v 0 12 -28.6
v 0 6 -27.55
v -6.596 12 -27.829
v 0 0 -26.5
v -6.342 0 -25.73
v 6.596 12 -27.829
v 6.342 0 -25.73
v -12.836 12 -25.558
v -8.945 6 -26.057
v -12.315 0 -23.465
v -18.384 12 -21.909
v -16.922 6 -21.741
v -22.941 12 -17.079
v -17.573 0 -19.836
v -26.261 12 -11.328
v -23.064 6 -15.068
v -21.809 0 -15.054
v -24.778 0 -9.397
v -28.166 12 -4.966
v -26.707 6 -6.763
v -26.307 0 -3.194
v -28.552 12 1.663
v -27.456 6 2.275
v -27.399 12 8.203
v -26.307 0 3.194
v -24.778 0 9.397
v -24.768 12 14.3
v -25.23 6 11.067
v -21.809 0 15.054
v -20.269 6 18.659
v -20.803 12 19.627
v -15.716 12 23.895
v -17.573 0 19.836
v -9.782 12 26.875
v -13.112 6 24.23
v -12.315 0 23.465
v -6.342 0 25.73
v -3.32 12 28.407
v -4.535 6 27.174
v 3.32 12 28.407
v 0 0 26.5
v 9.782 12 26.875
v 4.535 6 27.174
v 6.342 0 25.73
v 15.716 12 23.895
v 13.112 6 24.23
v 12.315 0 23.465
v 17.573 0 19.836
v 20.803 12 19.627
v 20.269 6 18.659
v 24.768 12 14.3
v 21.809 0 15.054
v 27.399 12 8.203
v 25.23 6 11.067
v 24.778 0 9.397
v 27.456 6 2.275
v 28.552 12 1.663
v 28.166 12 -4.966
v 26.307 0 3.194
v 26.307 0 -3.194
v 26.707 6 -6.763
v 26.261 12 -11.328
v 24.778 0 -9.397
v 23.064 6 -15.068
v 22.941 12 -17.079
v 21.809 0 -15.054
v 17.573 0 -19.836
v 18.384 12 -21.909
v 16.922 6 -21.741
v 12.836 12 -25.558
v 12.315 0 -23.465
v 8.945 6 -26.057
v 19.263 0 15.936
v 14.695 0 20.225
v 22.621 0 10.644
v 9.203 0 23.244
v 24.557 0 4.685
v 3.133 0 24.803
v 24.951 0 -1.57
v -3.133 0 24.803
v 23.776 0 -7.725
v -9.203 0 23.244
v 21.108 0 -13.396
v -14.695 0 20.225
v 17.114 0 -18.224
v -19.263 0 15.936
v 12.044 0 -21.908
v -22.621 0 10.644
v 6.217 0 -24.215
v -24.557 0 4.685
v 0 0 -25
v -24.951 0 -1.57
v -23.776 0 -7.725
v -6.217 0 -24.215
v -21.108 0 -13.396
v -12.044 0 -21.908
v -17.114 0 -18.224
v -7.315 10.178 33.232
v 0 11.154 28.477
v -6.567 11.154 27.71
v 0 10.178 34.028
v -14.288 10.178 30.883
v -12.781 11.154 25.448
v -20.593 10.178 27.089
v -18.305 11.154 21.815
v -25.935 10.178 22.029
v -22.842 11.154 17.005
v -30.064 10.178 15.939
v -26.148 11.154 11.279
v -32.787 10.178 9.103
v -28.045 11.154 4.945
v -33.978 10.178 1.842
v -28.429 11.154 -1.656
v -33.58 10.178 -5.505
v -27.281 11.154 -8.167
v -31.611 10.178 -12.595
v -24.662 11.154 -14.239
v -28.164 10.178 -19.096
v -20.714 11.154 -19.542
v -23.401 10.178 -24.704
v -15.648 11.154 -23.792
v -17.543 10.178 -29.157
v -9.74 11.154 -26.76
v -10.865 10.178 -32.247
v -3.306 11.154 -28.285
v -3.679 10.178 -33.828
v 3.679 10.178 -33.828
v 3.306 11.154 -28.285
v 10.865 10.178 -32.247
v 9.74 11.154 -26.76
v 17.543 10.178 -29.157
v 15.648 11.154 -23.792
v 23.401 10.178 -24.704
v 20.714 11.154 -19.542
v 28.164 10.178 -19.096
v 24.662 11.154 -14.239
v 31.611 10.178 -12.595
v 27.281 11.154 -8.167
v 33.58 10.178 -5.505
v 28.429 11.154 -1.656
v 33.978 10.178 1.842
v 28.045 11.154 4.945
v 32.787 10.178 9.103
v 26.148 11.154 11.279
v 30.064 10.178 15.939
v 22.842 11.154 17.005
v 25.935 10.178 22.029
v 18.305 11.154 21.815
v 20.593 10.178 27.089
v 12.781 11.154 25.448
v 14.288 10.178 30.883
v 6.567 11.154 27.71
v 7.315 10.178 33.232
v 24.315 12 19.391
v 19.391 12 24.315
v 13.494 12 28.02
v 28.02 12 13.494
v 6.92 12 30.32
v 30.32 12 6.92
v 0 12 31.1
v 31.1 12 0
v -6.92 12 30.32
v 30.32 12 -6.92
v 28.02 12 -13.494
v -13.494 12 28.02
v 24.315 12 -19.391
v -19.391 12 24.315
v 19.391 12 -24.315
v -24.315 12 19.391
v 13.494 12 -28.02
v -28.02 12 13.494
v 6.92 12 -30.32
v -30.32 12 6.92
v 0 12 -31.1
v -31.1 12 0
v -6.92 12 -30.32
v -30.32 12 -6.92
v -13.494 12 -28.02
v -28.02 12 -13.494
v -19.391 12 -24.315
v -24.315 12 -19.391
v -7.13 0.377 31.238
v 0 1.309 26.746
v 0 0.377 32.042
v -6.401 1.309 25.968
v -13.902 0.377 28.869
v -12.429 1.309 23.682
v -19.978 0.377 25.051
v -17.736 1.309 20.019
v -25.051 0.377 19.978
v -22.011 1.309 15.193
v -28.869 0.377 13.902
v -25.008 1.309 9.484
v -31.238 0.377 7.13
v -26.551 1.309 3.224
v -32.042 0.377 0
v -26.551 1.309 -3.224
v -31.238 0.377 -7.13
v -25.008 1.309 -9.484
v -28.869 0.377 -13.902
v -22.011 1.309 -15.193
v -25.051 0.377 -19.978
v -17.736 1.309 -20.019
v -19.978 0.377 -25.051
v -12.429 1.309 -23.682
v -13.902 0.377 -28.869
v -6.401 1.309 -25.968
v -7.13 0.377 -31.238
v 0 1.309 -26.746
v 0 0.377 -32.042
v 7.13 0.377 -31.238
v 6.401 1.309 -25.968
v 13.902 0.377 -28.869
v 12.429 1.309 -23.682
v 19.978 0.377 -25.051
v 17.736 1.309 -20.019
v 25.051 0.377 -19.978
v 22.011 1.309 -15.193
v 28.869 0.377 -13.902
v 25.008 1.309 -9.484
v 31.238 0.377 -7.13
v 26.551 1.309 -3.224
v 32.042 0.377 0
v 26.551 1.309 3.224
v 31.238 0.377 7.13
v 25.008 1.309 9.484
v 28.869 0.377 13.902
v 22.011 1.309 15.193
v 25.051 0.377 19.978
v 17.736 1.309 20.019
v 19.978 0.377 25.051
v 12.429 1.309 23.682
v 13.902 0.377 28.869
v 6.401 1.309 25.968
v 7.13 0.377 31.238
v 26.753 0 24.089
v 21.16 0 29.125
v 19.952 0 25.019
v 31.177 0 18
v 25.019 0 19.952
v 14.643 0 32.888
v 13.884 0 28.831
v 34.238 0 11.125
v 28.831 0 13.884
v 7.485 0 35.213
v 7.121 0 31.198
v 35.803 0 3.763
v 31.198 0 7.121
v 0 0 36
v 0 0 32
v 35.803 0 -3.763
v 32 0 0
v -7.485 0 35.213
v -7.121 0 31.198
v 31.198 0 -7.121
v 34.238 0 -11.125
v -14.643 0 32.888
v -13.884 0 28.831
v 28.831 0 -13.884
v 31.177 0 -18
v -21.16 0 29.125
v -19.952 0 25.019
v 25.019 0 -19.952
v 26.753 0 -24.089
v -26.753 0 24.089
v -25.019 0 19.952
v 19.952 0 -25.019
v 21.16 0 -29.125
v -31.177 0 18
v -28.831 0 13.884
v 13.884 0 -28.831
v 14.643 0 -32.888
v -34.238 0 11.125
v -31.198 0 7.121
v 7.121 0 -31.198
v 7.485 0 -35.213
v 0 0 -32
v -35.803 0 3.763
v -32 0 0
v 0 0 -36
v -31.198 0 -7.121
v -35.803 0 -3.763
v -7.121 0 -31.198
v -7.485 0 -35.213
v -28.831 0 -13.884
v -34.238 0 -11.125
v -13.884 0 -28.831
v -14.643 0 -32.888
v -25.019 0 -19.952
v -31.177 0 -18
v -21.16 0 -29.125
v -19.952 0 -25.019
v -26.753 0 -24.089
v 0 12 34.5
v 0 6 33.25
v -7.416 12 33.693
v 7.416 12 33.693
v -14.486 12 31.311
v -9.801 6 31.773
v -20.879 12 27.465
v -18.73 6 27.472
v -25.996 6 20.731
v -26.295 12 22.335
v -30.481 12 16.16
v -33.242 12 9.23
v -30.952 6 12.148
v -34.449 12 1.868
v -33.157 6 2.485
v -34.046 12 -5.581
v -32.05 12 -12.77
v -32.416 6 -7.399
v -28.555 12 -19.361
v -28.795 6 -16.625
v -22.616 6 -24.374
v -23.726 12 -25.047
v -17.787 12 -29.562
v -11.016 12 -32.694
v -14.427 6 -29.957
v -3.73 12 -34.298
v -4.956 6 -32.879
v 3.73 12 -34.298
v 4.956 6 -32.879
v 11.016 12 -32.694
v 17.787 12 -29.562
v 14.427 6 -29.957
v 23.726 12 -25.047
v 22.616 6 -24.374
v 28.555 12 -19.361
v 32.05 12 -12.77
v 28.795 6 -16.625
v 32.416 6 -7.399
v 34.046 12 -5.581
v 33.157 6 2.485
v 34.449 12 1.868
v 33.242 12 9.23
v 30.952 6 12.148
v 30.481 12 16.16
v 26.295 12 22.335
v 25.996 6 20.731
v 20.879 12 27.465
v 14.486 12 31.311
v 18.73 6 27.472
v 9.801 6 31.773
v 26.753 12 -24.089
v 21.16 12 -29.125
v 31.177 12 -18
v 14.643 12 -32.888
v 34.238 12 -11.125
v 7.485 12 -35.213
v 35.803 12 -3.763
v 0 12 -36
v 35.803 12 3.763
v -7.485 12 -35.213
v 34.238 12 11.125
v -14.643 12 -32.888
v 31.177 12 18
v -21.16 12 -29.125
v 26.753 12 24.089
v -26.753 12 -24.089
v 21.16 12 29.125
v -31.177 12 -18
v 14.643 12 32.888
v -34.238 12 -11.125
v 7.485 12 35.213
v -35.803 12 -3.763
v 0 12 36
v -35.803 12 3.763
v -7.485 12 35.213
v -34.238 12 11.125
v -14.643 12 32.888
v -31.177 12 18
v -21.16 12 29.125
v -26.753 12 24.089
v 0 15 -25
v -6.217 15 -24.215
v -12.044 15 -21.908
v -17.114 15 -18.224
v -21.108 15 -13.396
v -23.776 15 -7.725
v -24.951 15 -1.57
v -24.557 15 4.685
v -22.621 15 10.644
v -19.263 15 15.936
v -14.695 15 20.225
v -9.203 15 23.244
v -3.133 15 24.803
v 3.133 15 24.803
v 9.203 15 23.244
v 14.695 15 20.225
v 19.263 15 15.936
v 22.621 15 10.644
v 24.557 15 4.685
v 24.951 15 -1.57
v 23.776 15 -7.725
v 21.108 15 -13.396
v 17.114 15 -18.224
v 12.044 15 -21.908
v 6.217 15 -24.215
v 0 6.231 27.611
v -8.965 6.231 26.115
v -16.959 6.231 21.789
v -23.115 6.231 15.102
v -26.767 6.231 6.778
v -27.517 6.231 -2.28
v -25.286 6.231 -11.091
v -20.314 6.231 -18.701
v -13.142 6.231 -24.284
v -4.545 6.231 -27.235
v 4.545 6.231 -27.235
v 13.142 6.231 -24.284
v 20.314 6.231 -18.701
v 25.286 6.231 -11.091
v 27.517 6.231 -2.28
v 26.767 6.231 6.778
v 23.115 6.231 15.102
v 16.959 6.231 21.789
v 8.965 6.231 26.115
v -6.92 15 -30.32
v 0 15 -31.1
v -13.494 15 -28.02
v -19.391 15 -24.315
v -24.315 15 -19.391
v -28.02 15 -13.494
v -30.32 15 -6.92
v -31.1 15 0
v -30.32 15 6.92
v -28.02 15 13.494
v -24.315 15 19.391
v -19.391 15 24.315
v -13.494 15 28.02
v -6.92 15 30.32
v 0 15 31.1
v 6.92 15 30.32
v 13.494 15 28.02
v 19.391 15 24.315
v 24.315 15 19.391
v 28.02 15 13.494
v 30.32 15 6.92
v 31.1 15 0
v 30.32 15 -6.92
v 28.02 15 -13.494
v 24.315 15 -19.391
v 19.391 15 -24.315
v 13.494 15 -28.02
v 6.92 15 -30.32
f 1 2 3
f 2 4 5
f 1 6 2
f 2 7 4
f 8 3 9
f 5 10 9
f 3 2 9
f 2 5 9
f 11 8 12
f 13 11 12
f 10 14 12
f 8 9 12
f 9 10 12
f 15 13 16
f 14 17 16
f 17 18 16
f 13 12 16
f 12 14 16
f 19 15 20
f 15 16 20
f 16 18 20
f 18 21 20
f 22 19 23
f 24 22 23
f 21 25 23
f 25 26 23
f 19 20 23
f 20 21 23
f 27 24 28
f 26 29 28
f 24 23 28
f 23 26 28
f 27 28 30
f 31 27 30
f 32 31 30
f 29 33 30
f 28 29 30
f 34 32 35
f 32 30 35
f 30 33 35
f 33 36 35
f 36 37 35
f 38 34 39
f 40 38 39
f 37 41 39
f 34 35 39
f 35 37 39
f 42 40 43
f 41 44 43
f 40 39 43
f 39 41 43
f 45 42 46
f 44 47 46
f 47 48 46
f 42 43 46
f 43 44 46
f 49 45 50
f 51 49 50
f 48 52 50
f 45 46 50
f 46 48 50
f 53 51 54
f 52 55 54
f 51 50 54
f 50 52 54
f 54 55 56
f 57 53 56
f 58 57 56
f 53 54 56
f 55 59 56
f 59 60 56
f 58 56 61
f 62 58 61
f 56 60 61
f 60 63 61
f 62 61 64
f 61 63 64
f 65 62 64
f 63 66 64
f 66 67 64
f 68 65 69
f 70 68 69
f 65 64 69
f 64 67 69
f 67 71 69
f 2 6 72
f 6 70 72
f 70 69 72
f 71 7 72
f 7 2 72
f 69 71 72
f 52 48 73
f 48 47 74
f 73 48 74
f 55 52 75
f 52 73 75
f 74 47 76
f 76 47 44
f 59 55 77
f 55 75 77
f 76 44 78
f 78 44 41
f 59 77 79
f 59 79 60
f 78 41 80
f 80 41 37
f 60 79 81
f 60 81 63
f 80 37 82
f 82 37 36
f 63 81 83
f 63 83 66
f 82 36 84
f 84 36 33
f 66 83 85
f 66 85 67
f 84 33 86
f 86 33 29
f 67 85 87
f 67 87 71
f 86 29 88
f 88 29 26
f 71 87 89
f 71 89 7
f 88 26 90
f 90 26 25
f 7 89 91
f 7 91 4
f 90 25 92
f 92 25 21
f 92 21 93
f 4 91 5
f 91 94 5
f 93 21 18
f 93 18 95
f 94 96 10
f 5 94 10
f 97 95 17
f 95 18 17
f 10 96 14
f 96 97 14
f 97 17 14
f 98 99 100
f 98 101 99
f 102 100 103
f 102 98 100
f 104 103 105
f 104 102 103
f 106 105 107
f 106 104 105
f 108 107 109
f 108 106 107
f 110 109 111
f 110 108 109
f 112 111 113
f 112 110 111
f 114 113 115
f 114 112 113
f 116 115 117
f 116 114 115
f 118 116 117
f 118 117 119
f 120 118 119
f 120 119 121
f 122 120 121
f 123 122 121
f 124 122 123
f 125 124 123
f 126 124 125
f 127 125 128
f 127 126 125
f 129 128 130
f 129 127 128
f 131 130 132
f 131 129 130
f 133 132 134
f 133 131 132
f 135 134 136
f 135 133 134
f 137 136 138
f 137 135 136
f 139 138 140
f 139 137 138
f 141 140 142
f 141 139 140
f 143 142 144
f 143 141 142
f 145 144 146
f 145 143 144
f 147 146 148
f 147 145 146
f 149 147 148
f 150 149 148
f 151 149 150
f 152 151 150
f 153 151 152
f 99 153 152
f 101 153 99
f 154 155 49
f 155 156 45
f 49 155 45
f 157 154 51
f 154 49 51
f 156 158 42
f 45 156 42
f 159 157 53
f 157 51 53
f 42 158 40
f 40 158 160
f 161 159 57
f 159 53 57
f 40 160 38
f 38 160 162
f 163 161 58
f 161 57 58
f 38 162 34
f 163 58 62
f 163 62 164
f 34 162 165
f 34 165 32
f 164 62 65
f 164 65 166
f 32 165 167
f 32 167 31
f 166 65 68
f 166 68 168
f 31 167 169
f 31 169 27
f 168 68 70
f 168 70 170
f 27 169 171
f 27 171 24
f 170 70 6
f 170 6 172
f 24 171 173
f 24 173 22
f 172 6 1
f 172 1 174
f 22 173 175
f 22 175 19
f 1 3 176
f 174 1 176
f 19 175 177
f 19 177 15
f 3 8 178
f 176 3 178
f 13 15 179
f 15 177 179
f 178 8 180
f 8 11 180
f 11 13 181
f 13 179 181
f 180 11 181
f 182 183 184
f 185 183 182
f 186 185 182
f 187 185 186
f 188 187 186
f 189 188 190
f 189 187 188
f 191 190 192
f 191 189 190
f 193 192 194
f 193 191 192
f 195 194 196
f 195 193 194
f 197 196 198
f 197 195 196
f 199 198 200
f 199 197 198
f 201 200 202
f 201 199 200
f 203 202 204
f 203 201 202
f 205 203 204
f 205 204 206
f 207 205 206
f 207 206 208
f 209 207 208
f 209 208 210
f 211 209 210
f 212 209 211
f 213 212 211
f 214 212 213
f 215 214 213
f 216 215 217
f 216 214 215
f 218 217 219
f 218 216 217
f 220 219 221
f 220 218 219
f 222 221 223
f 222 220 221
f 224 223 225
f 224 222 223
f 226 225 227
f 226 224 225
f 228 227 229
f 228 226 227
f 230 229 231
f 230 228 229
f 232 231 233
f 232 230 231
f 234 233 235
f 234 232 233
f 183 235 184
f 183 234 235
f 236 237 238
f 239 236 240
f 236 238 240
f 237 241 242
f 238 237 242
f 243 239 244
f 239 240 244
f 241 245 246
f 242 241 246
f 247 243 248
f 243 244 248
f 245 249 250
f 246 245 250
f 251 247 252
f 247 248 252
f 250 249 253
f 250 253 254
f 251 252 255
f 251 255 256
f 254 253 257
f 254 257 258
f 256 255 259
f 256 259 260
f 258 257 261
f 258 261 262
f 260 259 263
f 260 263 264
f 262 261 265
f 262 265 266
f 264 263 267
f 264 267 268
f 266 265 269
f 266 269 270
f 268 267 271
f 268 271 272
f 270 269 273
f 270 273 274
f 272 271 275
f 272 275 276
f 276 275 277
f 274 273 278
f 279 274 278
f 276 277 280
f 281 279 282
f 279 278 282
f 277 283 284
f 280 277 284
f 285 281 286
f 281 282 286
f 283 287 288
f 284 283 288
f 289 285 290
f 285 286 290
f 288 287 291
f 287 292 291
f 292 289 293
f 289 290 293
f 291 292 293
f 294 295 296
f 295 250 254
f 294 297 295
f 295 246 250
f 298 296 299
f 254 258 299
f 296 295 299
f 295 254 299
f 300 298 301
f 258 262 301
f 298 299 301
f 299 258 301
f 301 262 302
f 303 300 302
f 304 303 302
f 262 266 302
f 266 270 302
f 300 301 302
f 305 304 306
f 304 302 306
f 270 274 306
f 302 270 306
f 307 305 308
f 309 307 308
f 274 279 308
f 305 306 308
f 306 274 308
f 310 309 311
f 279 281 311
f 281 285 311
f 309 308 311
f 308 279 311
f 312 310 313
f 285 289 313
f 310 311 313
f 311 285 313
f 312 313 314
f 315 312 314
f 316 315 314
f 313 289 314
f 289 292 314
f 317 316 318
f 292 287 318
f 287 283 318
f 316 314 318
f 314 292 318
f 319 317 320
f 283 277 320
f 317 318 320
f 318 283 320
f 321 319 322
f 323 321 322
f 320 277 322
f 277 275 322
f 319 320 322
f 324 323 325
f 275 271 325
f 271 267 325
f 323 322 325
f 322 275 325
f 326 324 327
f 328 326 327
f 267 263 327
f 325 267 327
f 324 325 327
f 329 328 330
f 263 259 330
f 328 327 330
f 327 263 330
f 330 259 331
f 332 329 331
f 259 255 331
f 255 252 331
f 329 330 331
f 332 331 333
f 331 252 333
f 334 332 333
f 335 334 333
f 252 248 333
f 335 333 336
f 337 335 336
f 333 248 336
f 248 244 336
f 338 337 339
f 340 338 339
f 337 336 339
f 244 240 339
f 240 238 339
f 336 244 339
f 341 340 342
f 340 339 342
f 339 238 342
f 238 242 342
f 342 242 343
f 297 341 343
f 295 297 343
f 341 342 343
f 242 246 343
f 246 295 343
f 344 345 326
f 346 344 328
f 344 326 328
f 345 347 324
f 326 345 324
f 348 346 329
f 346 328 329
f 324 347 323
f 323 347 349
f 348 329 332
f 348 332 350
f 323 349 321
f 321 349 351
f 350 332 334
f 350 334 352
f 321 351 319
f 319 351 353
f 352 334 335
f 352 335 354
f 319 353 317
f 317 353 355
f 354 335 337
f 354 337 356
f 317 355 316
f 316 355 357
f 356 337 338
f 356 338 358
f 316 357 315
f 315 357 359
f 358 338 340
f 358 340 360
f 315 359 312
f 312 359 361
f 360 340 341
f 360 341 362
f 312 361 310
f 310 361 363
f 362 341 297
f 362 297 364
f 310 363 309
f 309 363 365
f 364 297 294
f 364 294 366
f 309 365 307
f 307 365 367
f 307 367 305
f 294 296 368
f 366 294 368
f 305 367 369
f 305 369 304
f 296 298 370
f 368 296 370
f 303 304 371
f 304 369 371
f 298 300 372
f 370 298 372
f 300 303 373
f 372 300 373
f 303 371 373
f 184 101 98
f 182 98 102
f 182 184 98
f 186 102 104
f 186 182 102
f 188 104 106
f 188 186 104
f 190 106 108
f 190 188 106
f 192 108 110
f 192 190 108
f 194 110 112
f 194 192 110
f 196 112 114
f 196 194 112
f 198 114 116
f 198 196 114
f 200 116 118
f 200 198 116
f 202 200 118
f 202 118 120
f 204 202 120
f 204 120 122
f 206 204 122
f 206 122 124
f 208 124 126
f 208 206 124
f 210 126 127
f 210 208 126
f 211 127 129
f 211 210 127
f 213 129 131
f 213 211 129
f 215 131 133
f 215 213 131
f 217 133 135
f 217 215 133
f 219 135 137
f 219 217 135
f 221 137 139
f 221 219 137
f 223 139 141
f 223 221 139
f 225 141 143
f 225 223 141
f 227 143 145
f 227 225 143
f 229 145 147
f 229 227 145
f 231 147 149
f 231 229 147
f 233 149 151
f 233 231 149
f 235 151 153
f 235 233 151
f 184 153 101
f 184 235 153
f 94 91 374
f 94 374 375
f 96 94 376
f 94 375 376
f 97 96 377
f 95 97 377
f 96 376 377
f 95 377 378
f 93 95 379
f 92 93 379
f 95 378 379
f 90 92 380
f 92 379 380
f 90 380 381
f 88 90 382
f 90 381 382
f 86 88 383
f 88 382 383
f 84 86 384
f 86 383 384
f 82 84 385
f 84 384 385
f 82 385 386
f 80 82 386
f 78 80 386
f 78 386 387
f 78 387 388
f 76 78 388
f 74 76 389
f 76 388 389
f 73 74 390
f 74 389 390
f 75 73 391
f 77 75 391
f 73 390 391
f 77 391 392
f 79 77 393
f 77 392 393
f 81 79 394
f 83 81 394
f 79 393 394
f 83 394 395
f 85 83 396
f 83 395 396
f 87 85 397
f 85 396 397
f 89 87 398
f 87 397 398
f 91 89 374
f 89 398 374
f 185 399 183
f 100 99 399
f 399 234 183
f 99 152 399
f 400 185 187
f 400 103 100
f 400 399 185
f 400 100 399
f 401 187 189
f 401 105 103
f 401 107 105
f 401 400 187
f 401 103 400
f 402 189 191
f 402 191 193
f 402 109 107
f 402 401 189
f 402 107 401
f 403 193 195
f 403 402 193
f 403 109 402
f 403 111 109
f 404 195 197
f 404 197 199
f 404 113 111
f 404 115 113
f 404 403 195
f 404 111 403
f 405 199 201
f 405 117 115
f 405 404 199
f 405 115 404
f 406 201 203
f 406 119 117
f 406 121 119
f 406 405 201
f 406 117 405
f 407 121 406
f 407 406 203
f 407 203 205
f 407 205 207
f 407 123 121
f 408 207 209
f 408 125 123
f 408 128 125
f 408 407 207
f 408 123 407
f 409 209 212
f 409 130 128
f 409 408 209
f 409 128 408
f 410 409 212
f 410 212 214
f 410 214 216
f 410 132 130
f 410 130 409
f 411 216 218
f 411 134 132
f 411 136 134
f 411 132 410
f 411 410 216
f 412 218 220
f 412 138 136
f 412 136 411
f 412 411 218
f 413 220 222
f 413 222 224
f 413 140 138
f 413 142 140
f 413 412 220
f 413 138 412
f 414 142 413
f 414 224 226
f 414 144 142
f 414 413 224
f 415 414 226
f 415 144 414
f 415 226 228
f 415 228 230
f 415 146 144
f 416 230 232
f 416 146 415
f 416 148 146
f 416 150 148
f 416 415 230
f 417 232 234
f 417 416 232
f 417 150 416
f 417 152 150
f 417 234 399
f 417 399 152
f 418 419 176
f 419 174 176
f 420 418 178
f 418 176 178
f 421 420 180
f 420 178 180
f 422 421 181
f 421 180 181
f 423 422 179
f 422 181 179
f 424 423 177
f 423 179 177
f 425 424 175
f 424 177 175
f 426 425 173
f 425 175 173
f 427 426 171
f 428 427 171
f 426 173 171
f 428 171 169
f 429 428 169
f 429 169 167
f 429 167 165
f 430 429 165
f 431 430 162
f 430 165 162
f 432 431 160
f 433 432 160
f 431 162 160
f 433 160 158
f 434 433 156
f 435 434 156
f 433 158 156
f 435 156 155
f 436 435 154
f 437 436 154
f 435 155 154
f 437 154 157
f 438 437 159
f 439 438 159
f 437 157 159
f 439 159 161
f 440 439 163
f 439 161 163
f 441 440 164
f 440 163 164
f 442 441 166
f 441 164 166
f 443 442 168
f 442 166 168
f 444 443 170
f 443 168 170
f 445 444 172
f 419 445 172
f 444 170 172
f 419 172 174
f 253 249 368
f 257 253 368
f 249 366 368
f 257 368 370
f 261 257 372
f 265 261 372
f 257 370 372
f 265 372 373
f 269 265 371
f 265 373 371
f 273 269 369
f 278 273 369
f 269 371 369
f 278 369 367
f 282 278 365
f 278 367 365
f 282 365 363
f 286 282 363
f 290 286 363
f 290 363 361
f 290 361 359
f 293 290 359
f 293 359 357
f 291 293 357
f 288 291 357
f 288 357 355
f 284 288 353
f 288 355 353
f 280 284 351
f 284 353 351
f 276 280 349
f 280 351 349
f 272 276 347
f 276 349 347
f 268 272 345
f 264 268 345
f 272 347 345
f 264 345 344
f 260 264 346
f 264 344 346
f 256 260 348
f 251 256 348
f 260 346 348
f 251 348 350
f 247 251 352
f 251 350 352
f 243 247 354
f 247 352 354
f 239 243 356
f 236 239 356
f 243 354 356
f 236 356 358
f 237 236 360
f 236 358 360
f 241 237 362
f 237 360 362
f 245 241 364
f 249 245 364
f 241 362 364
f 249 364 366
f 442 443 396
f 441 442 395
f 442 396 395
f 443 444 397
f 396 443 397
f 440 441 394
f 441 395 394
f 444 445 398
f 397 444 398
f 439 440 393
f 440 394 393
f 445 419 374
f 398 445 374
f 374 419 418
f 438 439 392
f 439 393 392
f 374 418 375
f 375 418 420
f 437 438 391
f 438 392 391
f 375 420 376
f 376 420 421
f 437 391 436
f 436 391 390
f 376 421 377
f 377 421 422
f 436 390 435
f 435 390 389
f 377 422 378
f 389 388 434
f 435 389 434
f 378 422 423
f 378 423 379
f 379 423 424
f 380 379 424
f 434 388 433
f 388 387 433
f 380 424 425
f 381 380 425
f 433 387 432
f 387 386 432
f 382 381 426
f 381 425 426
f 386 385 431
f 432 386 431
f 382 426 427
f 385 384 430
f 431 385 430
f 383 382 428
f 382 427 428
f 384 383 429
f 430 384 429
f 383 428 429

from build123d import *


with BuildPart() as part:
    # Skizze1 → Rotation1 (revolve)
    with BuildSketch(Plane.XY, mode=Mode.PRIVATE) as rotation1_sk:
        Polygon((32, 0), (36, 0), (36, 12), (34.5, 12), align=None)
    revolve(rotation1_sk.sketch.rotate(Axis((0, 0, 0), (0, -1, 0)), 90), axis=Axis((0, 0, 0), (0, -1, 0)))


with BuildPart() as body_2:
    # Skizze4 → Rotation2 (revolve)
    with BuildSketch(Plane.XY, mode=Mode.PRIVATE) as rotation2_sk:
        Polygon((26.5, 0), (25, 0), (25, 15), (31.1, 15), (31.1, 12), (28.6, 12), align=None)
    revolve(rotation2_sk.sketch.rotate(Axis((0, 0, 0), (0, 1, 0)), 90), axis=Axis((0, 0, 0), (0, 1, 0)))


with BuildPart() as body_3:
    # Skizze5 → Rotation3 (revolve)
    with BuildSketch(Plane.XY, mode=Mode.PRIVATE) as rotation3_sk:
        Polygon((32.041793551, 0.377136413), (26.74567254, 1.308546655), (28.477177317, 11.154110311), (34.02778686, 10.177944062), align=None)
    revolve(rotation3_sk.sketch.rotate(Axis((0, 0, 0), (0, -1, 0)), 90), axis=Axis((0, 0, 0), (0, -1, 0)))


solid = Compound([part.part, body_2.part, body_3.part])
